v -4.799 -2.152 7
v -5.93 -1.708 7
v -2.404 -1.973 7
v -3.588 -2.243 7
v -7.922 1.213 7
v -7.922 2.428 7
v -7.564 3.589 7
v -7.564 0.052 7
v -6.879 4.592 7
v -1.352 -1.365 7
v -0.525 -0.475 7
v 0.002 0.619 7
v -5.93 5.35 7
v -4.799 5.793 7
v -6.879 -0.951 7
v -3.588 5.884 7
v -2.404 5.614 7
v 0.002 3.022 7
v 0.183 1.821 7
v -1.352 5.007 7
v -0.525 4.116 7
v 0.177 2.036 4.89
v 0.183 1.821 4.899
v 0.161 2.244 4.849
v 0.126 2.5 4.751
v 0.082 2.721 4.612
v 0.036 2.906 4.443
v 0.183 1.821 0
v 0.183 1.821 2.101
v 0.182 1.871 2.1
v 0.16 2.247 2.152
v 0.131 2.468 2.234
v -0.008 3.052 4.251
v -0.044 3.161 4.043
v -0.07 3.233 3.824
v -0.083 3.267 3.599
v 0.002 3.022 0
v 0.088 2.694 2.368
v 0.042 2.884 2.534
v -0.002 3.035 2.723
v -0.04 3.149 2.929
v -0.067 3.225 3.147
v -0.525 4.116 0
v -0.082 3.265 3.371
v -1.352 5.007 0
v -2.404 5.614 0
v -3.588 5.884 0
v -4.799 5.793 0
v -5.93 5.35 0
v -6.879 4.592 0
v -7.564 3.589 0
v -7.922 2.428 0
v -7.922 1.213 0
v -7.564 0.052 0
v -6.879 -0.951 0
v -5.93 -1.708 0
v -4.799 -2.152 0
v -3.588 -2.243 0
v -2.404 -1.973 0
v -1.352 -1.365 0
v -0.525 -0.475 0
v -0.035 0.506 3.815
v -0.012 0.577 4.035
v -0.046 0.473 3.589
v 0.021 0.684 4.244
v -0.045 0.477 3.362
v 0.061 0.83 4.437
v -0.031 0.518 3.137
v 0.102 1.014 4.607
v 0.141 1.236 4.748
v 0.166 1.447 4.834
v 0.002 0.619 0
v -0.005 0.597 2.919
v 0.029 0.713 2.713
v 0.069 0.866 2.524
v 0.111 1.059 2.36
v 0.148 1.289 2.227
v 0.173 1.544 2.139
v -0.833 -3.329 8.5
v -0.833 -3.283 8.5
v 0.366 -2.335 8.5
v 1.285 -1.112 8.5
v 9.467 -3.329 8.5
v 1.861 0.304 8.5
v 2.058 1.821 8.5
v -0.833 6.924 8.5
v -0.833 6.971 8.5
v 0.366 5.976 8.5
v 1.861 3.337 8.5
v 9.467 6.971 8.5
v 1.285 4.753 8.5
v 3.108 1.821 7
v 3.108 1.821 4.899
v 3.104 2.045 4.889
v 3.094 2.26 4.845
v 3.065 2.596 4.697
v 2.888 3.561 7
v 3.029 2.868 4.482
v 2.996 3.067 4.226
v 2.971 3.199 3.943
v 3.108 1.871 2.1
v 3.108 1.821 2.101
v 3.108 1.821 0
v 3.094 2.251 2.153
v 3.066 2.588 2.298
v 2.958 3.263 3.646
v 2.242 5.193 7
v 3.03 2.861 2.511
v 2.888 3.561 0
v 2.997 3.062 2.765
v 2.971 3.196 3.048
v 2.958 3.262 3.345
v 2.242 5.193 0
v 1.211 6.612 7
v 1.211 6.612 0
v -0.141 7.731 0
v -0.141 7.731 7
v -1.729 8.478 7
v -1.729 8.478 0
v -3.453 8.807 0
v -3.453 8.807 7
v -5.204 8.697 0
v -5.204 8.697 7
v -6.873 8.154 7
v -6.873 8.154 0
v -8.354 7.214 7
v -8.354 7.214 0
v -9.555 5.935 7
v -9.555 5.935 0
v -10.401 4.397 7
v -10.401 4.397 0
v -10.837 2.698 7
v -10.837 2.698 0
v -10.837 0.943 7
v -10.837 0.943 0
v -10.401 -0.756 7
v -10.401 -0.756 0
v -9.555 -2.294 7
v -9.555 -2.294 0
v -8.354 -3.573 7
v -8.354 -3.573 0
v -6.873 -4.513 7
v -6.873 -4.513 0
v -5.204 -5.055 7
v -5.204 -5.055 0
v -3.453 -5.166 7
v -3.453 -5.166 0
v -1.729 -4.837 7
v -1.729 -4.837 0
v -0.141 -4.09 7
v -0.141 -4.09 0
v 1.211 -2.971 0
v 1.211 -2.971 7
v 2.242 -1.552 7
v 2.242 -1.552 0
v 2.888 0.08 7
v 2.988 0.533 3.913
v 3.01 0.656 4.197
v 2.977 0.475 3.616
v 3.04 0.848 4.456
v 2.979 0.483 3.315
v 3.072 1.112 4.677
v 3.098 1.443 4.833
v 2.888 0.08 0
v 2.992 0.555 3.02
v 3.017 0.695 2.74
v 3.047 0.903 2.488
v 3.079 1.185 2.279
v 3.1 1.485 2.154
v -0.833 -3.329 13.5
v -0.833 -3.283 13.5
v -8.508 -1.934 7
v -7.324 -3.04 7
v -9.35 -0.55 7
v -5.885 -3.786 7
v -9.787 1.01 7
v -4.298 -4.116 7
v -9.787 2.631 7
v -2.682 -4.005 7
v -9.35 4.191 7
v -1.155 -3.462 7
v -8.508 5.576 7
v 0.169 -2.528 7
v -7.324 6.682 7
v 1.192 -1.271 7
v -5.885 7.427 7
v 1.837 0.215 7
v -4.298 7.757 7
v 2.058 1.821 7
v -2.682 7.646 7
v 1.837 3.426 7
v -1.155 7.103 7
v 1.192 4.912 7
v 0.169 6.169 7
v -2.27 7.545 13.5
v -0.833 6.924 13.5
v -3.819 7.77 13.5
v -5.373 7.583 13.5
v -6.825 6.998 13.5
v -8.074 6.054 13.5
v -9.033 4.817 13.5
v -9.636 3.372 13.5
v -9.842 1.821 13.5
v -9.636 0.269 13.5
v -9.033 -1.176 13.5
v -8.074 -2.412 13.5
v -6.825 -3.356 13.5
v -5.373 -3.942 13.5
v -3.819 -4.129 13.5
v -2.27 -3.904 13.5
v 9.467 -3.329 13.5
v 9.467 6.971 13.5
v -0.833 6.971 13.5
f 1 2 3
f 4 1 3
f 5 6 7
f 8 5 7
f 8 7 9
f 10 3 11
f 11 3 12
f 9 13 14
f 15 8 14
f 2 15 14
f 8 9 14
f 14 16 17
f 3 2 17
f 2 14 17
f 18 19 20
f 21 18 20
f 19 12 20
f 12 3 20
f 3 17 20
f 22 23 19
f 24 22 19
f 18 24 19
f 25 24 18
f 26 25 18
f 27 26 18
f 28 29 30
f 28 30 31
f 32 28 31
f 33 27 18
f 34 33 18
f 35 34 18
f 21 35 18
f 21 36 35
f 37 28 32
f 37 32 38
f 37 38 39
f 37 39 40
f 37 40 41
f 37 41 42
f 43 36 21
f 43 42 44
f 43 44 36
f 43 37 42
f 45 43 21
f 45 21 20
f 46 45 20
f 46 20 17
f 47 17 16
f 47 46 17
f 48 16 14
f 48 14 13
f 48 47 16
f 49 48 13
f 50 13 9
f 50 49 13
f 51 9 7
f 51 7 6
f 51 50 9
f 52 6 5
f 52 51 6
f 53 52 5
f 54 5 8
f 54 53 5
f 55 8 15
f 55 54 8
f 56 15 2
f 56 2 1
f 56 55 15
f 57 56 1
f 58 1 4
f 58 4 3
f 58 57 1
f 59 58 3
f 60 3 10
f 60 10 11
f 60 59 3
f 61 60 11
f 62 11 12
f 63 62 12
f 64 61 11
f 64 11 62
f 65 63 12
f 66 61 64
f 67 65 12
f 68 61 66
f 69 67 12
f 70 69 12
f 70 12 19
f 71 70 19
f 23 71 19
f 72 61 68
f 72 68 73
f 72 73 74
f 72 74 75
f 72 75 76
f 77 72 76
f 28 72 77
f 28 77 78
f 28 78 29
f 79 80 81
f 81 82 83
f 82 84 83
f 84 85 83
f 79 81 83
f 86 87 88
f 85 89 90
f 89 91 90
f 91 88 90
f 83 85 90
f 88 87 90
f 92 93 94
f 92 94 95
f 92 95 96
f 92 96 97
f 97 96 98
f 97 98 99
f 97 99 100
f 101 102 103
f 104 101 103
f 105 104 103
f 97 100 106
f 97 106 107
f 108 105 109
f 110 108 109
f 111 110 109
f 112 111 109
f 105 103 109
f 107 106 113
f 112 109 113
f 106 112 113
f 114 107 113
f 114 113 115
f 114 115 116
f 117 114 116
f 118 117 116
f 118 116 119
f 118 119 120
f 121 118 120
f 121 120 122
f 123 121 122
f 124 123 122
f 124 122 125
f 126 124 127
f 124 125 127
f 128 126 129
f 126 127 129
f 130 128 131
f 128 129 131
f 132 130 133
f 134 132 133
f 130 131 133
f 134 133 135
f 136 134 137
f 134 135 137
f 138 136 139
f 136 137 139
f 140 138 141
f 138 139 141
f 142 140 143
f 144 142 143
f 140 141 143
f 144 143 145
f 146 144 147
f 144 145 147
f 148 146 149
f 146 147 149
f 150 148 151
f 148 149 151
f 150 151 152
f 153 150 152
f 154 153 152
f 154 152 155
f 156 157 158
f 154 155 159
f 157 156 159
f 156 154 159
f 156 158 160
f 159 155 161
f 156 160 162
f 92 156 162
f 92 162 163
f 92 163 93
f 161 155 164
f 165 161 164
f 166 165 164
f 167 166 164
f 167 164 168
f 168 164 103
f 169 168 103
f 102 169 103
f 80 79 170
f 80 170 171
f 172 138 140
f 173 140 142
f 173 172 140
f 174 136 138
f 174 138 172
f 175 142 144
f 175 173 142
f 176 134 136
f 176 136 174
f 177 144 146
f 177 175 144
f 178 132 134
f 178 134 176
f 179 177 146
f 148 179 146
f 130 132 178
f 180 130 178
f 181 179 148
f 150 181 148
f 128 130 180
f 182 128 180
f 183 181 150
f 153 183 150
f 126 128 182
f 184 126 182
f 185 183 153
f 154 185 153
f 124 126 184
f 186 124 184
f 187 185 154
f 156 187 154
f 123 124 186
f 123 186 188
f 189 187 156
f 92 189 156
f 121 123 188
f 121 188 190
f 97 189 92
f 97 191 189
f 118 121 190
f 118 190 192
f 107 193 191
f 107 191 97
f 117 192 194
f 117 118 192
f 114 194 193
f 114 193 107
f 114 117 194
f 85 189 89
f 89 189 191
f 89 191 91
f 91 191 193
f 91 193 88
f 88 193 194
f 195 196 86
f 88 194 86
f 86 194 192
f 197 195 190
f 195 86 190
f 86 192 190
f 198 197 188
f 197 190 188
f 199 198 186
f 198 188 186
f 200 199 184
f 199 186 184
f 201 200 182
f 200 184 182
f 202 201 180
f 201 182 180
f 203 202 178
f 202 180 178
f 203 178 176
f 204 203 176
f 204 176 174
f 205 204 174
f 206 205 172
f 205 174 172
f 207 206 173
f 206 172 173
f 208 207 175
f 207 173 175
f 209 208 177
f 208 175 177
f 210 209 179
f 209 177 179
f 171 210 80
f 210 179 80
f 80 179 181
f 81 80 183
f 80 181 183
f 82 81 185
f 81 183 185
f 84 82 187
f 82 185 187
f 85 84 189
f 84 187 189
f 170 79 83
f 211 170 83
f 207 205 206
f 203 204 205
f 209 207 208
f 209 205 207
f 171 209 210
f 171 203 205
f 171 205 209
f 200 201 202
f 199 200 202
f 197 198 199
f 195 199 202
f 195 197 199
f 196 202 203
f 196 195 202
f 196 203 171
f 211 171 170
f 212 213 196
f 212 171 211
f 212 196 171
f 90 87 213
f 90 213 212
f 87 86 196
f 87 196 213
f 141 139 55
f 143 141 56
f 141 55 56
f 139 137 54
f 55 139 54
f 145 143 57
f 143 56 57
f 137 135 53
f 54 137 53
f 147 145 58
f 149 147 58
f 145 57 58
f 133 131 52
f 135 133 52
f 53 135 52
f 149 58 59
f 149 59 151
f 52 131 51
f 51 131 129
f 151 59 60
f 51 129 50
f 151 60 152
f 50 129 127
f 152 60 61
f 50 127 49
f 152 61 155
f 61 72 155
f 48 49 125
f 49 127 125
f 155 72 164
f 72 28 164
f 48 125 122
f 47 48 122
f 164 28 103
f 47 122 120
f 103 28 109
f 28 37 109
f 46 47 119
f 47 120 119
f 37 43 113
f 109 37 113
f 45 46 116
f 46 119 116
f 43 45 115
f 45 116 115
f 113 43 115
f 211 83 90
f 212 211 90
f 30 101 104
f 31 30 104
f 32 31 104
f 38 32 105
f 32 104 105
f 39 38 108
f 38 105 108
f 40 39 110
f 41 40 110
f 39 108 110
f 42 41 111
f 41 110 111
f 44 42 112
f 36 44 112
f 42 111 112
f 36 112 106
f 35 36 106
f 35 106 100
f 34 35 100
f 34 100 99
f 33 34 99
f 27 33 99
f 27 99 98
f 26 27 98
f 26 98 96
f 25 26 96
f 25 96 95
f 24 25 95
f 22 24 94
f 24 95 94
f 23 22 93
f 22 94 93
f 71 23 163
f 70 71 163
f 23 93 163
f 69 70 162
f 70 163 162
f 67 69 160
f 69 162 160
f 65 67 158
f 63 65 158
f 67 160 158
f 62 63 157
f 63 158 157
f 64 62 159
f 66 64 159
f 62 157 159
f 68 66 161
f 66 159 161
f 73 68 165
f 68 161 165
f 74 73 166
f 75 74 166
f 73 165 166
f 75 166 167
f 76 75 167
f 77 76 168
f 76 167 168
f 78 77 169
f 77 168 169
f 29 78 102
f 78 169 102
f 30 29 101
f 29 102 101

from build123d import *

# Parameters (mm, degrees)
SKETCH1_R           = 7
SKETCH1_R_2         = 4.075
BOSS_EXTRUDE1_DEPTH = 7
SKETCH2_R           = 5.95
BOSS_EXTRUDE2_DEPTH = 1.5
SKETCH3_R           = 5.95
SKETCH3_W           = 10.3
SKETCH3_H           = 10.3
BOSS_EXTRUDE3_DEPTH = 5
SKETCH4_R           = 1.4
CUT_EXTRUDE2_DEPTH  = 10


with BuildPart() as part:
    # Sketch1 → Boss-Extrude1 (new body)
    with BuildSketch(Plane.XY):
        with Locations((-3.892264878, 1.820575507)):
            Circle(SKETCH1_R)
        with Locations((-3.892264878, 1.820575507)):
            Circle(SKETCH1_R_2, mode=Mode.SUBTRACT)
    extrude(amount=BOSS_EXTRUDE1_DEPTH)

    # Sketch2 → Boss-Extrude2 (add)
    with BuildSketch(Plane.XY.offset(7)):
        with Locations((-3.892264878, 1.820575507)):
            Circle(SKETCH2_R)
    extrude(amount=BOSS_EXTRUDE2_DEPTH)

    # Sketch3 → Boss-Extrude3 (add)
    with BuildSketch(Plane.XY.offset(8.5)):
        with Locations((-3.892264878, 1.820575507)):
            Circle(SKETCH3_R)
        with Locations((4.316754573, 1.820575507)):
            Rectangle(SKETCH3_W, SKETCH3_H)
    extrude(amount=BOSS_EXTRUDE3_DEPTH)

    # Sketch4 → Cut-Extrude2 (cut)
    with BuildSketch(Plane(origin=(9.466754573, 0, 0), x_dir=(0, 0, -1), z_dir=(1, 0, 0))):
        with Locations((-3.5, 1.870575507)):
            Circle(SKETCH4_R)
    extrude(amount=-CUT_EXTRUDE2_DEPTH, mode=Mode.SUBTRACT)


solid = part.part
